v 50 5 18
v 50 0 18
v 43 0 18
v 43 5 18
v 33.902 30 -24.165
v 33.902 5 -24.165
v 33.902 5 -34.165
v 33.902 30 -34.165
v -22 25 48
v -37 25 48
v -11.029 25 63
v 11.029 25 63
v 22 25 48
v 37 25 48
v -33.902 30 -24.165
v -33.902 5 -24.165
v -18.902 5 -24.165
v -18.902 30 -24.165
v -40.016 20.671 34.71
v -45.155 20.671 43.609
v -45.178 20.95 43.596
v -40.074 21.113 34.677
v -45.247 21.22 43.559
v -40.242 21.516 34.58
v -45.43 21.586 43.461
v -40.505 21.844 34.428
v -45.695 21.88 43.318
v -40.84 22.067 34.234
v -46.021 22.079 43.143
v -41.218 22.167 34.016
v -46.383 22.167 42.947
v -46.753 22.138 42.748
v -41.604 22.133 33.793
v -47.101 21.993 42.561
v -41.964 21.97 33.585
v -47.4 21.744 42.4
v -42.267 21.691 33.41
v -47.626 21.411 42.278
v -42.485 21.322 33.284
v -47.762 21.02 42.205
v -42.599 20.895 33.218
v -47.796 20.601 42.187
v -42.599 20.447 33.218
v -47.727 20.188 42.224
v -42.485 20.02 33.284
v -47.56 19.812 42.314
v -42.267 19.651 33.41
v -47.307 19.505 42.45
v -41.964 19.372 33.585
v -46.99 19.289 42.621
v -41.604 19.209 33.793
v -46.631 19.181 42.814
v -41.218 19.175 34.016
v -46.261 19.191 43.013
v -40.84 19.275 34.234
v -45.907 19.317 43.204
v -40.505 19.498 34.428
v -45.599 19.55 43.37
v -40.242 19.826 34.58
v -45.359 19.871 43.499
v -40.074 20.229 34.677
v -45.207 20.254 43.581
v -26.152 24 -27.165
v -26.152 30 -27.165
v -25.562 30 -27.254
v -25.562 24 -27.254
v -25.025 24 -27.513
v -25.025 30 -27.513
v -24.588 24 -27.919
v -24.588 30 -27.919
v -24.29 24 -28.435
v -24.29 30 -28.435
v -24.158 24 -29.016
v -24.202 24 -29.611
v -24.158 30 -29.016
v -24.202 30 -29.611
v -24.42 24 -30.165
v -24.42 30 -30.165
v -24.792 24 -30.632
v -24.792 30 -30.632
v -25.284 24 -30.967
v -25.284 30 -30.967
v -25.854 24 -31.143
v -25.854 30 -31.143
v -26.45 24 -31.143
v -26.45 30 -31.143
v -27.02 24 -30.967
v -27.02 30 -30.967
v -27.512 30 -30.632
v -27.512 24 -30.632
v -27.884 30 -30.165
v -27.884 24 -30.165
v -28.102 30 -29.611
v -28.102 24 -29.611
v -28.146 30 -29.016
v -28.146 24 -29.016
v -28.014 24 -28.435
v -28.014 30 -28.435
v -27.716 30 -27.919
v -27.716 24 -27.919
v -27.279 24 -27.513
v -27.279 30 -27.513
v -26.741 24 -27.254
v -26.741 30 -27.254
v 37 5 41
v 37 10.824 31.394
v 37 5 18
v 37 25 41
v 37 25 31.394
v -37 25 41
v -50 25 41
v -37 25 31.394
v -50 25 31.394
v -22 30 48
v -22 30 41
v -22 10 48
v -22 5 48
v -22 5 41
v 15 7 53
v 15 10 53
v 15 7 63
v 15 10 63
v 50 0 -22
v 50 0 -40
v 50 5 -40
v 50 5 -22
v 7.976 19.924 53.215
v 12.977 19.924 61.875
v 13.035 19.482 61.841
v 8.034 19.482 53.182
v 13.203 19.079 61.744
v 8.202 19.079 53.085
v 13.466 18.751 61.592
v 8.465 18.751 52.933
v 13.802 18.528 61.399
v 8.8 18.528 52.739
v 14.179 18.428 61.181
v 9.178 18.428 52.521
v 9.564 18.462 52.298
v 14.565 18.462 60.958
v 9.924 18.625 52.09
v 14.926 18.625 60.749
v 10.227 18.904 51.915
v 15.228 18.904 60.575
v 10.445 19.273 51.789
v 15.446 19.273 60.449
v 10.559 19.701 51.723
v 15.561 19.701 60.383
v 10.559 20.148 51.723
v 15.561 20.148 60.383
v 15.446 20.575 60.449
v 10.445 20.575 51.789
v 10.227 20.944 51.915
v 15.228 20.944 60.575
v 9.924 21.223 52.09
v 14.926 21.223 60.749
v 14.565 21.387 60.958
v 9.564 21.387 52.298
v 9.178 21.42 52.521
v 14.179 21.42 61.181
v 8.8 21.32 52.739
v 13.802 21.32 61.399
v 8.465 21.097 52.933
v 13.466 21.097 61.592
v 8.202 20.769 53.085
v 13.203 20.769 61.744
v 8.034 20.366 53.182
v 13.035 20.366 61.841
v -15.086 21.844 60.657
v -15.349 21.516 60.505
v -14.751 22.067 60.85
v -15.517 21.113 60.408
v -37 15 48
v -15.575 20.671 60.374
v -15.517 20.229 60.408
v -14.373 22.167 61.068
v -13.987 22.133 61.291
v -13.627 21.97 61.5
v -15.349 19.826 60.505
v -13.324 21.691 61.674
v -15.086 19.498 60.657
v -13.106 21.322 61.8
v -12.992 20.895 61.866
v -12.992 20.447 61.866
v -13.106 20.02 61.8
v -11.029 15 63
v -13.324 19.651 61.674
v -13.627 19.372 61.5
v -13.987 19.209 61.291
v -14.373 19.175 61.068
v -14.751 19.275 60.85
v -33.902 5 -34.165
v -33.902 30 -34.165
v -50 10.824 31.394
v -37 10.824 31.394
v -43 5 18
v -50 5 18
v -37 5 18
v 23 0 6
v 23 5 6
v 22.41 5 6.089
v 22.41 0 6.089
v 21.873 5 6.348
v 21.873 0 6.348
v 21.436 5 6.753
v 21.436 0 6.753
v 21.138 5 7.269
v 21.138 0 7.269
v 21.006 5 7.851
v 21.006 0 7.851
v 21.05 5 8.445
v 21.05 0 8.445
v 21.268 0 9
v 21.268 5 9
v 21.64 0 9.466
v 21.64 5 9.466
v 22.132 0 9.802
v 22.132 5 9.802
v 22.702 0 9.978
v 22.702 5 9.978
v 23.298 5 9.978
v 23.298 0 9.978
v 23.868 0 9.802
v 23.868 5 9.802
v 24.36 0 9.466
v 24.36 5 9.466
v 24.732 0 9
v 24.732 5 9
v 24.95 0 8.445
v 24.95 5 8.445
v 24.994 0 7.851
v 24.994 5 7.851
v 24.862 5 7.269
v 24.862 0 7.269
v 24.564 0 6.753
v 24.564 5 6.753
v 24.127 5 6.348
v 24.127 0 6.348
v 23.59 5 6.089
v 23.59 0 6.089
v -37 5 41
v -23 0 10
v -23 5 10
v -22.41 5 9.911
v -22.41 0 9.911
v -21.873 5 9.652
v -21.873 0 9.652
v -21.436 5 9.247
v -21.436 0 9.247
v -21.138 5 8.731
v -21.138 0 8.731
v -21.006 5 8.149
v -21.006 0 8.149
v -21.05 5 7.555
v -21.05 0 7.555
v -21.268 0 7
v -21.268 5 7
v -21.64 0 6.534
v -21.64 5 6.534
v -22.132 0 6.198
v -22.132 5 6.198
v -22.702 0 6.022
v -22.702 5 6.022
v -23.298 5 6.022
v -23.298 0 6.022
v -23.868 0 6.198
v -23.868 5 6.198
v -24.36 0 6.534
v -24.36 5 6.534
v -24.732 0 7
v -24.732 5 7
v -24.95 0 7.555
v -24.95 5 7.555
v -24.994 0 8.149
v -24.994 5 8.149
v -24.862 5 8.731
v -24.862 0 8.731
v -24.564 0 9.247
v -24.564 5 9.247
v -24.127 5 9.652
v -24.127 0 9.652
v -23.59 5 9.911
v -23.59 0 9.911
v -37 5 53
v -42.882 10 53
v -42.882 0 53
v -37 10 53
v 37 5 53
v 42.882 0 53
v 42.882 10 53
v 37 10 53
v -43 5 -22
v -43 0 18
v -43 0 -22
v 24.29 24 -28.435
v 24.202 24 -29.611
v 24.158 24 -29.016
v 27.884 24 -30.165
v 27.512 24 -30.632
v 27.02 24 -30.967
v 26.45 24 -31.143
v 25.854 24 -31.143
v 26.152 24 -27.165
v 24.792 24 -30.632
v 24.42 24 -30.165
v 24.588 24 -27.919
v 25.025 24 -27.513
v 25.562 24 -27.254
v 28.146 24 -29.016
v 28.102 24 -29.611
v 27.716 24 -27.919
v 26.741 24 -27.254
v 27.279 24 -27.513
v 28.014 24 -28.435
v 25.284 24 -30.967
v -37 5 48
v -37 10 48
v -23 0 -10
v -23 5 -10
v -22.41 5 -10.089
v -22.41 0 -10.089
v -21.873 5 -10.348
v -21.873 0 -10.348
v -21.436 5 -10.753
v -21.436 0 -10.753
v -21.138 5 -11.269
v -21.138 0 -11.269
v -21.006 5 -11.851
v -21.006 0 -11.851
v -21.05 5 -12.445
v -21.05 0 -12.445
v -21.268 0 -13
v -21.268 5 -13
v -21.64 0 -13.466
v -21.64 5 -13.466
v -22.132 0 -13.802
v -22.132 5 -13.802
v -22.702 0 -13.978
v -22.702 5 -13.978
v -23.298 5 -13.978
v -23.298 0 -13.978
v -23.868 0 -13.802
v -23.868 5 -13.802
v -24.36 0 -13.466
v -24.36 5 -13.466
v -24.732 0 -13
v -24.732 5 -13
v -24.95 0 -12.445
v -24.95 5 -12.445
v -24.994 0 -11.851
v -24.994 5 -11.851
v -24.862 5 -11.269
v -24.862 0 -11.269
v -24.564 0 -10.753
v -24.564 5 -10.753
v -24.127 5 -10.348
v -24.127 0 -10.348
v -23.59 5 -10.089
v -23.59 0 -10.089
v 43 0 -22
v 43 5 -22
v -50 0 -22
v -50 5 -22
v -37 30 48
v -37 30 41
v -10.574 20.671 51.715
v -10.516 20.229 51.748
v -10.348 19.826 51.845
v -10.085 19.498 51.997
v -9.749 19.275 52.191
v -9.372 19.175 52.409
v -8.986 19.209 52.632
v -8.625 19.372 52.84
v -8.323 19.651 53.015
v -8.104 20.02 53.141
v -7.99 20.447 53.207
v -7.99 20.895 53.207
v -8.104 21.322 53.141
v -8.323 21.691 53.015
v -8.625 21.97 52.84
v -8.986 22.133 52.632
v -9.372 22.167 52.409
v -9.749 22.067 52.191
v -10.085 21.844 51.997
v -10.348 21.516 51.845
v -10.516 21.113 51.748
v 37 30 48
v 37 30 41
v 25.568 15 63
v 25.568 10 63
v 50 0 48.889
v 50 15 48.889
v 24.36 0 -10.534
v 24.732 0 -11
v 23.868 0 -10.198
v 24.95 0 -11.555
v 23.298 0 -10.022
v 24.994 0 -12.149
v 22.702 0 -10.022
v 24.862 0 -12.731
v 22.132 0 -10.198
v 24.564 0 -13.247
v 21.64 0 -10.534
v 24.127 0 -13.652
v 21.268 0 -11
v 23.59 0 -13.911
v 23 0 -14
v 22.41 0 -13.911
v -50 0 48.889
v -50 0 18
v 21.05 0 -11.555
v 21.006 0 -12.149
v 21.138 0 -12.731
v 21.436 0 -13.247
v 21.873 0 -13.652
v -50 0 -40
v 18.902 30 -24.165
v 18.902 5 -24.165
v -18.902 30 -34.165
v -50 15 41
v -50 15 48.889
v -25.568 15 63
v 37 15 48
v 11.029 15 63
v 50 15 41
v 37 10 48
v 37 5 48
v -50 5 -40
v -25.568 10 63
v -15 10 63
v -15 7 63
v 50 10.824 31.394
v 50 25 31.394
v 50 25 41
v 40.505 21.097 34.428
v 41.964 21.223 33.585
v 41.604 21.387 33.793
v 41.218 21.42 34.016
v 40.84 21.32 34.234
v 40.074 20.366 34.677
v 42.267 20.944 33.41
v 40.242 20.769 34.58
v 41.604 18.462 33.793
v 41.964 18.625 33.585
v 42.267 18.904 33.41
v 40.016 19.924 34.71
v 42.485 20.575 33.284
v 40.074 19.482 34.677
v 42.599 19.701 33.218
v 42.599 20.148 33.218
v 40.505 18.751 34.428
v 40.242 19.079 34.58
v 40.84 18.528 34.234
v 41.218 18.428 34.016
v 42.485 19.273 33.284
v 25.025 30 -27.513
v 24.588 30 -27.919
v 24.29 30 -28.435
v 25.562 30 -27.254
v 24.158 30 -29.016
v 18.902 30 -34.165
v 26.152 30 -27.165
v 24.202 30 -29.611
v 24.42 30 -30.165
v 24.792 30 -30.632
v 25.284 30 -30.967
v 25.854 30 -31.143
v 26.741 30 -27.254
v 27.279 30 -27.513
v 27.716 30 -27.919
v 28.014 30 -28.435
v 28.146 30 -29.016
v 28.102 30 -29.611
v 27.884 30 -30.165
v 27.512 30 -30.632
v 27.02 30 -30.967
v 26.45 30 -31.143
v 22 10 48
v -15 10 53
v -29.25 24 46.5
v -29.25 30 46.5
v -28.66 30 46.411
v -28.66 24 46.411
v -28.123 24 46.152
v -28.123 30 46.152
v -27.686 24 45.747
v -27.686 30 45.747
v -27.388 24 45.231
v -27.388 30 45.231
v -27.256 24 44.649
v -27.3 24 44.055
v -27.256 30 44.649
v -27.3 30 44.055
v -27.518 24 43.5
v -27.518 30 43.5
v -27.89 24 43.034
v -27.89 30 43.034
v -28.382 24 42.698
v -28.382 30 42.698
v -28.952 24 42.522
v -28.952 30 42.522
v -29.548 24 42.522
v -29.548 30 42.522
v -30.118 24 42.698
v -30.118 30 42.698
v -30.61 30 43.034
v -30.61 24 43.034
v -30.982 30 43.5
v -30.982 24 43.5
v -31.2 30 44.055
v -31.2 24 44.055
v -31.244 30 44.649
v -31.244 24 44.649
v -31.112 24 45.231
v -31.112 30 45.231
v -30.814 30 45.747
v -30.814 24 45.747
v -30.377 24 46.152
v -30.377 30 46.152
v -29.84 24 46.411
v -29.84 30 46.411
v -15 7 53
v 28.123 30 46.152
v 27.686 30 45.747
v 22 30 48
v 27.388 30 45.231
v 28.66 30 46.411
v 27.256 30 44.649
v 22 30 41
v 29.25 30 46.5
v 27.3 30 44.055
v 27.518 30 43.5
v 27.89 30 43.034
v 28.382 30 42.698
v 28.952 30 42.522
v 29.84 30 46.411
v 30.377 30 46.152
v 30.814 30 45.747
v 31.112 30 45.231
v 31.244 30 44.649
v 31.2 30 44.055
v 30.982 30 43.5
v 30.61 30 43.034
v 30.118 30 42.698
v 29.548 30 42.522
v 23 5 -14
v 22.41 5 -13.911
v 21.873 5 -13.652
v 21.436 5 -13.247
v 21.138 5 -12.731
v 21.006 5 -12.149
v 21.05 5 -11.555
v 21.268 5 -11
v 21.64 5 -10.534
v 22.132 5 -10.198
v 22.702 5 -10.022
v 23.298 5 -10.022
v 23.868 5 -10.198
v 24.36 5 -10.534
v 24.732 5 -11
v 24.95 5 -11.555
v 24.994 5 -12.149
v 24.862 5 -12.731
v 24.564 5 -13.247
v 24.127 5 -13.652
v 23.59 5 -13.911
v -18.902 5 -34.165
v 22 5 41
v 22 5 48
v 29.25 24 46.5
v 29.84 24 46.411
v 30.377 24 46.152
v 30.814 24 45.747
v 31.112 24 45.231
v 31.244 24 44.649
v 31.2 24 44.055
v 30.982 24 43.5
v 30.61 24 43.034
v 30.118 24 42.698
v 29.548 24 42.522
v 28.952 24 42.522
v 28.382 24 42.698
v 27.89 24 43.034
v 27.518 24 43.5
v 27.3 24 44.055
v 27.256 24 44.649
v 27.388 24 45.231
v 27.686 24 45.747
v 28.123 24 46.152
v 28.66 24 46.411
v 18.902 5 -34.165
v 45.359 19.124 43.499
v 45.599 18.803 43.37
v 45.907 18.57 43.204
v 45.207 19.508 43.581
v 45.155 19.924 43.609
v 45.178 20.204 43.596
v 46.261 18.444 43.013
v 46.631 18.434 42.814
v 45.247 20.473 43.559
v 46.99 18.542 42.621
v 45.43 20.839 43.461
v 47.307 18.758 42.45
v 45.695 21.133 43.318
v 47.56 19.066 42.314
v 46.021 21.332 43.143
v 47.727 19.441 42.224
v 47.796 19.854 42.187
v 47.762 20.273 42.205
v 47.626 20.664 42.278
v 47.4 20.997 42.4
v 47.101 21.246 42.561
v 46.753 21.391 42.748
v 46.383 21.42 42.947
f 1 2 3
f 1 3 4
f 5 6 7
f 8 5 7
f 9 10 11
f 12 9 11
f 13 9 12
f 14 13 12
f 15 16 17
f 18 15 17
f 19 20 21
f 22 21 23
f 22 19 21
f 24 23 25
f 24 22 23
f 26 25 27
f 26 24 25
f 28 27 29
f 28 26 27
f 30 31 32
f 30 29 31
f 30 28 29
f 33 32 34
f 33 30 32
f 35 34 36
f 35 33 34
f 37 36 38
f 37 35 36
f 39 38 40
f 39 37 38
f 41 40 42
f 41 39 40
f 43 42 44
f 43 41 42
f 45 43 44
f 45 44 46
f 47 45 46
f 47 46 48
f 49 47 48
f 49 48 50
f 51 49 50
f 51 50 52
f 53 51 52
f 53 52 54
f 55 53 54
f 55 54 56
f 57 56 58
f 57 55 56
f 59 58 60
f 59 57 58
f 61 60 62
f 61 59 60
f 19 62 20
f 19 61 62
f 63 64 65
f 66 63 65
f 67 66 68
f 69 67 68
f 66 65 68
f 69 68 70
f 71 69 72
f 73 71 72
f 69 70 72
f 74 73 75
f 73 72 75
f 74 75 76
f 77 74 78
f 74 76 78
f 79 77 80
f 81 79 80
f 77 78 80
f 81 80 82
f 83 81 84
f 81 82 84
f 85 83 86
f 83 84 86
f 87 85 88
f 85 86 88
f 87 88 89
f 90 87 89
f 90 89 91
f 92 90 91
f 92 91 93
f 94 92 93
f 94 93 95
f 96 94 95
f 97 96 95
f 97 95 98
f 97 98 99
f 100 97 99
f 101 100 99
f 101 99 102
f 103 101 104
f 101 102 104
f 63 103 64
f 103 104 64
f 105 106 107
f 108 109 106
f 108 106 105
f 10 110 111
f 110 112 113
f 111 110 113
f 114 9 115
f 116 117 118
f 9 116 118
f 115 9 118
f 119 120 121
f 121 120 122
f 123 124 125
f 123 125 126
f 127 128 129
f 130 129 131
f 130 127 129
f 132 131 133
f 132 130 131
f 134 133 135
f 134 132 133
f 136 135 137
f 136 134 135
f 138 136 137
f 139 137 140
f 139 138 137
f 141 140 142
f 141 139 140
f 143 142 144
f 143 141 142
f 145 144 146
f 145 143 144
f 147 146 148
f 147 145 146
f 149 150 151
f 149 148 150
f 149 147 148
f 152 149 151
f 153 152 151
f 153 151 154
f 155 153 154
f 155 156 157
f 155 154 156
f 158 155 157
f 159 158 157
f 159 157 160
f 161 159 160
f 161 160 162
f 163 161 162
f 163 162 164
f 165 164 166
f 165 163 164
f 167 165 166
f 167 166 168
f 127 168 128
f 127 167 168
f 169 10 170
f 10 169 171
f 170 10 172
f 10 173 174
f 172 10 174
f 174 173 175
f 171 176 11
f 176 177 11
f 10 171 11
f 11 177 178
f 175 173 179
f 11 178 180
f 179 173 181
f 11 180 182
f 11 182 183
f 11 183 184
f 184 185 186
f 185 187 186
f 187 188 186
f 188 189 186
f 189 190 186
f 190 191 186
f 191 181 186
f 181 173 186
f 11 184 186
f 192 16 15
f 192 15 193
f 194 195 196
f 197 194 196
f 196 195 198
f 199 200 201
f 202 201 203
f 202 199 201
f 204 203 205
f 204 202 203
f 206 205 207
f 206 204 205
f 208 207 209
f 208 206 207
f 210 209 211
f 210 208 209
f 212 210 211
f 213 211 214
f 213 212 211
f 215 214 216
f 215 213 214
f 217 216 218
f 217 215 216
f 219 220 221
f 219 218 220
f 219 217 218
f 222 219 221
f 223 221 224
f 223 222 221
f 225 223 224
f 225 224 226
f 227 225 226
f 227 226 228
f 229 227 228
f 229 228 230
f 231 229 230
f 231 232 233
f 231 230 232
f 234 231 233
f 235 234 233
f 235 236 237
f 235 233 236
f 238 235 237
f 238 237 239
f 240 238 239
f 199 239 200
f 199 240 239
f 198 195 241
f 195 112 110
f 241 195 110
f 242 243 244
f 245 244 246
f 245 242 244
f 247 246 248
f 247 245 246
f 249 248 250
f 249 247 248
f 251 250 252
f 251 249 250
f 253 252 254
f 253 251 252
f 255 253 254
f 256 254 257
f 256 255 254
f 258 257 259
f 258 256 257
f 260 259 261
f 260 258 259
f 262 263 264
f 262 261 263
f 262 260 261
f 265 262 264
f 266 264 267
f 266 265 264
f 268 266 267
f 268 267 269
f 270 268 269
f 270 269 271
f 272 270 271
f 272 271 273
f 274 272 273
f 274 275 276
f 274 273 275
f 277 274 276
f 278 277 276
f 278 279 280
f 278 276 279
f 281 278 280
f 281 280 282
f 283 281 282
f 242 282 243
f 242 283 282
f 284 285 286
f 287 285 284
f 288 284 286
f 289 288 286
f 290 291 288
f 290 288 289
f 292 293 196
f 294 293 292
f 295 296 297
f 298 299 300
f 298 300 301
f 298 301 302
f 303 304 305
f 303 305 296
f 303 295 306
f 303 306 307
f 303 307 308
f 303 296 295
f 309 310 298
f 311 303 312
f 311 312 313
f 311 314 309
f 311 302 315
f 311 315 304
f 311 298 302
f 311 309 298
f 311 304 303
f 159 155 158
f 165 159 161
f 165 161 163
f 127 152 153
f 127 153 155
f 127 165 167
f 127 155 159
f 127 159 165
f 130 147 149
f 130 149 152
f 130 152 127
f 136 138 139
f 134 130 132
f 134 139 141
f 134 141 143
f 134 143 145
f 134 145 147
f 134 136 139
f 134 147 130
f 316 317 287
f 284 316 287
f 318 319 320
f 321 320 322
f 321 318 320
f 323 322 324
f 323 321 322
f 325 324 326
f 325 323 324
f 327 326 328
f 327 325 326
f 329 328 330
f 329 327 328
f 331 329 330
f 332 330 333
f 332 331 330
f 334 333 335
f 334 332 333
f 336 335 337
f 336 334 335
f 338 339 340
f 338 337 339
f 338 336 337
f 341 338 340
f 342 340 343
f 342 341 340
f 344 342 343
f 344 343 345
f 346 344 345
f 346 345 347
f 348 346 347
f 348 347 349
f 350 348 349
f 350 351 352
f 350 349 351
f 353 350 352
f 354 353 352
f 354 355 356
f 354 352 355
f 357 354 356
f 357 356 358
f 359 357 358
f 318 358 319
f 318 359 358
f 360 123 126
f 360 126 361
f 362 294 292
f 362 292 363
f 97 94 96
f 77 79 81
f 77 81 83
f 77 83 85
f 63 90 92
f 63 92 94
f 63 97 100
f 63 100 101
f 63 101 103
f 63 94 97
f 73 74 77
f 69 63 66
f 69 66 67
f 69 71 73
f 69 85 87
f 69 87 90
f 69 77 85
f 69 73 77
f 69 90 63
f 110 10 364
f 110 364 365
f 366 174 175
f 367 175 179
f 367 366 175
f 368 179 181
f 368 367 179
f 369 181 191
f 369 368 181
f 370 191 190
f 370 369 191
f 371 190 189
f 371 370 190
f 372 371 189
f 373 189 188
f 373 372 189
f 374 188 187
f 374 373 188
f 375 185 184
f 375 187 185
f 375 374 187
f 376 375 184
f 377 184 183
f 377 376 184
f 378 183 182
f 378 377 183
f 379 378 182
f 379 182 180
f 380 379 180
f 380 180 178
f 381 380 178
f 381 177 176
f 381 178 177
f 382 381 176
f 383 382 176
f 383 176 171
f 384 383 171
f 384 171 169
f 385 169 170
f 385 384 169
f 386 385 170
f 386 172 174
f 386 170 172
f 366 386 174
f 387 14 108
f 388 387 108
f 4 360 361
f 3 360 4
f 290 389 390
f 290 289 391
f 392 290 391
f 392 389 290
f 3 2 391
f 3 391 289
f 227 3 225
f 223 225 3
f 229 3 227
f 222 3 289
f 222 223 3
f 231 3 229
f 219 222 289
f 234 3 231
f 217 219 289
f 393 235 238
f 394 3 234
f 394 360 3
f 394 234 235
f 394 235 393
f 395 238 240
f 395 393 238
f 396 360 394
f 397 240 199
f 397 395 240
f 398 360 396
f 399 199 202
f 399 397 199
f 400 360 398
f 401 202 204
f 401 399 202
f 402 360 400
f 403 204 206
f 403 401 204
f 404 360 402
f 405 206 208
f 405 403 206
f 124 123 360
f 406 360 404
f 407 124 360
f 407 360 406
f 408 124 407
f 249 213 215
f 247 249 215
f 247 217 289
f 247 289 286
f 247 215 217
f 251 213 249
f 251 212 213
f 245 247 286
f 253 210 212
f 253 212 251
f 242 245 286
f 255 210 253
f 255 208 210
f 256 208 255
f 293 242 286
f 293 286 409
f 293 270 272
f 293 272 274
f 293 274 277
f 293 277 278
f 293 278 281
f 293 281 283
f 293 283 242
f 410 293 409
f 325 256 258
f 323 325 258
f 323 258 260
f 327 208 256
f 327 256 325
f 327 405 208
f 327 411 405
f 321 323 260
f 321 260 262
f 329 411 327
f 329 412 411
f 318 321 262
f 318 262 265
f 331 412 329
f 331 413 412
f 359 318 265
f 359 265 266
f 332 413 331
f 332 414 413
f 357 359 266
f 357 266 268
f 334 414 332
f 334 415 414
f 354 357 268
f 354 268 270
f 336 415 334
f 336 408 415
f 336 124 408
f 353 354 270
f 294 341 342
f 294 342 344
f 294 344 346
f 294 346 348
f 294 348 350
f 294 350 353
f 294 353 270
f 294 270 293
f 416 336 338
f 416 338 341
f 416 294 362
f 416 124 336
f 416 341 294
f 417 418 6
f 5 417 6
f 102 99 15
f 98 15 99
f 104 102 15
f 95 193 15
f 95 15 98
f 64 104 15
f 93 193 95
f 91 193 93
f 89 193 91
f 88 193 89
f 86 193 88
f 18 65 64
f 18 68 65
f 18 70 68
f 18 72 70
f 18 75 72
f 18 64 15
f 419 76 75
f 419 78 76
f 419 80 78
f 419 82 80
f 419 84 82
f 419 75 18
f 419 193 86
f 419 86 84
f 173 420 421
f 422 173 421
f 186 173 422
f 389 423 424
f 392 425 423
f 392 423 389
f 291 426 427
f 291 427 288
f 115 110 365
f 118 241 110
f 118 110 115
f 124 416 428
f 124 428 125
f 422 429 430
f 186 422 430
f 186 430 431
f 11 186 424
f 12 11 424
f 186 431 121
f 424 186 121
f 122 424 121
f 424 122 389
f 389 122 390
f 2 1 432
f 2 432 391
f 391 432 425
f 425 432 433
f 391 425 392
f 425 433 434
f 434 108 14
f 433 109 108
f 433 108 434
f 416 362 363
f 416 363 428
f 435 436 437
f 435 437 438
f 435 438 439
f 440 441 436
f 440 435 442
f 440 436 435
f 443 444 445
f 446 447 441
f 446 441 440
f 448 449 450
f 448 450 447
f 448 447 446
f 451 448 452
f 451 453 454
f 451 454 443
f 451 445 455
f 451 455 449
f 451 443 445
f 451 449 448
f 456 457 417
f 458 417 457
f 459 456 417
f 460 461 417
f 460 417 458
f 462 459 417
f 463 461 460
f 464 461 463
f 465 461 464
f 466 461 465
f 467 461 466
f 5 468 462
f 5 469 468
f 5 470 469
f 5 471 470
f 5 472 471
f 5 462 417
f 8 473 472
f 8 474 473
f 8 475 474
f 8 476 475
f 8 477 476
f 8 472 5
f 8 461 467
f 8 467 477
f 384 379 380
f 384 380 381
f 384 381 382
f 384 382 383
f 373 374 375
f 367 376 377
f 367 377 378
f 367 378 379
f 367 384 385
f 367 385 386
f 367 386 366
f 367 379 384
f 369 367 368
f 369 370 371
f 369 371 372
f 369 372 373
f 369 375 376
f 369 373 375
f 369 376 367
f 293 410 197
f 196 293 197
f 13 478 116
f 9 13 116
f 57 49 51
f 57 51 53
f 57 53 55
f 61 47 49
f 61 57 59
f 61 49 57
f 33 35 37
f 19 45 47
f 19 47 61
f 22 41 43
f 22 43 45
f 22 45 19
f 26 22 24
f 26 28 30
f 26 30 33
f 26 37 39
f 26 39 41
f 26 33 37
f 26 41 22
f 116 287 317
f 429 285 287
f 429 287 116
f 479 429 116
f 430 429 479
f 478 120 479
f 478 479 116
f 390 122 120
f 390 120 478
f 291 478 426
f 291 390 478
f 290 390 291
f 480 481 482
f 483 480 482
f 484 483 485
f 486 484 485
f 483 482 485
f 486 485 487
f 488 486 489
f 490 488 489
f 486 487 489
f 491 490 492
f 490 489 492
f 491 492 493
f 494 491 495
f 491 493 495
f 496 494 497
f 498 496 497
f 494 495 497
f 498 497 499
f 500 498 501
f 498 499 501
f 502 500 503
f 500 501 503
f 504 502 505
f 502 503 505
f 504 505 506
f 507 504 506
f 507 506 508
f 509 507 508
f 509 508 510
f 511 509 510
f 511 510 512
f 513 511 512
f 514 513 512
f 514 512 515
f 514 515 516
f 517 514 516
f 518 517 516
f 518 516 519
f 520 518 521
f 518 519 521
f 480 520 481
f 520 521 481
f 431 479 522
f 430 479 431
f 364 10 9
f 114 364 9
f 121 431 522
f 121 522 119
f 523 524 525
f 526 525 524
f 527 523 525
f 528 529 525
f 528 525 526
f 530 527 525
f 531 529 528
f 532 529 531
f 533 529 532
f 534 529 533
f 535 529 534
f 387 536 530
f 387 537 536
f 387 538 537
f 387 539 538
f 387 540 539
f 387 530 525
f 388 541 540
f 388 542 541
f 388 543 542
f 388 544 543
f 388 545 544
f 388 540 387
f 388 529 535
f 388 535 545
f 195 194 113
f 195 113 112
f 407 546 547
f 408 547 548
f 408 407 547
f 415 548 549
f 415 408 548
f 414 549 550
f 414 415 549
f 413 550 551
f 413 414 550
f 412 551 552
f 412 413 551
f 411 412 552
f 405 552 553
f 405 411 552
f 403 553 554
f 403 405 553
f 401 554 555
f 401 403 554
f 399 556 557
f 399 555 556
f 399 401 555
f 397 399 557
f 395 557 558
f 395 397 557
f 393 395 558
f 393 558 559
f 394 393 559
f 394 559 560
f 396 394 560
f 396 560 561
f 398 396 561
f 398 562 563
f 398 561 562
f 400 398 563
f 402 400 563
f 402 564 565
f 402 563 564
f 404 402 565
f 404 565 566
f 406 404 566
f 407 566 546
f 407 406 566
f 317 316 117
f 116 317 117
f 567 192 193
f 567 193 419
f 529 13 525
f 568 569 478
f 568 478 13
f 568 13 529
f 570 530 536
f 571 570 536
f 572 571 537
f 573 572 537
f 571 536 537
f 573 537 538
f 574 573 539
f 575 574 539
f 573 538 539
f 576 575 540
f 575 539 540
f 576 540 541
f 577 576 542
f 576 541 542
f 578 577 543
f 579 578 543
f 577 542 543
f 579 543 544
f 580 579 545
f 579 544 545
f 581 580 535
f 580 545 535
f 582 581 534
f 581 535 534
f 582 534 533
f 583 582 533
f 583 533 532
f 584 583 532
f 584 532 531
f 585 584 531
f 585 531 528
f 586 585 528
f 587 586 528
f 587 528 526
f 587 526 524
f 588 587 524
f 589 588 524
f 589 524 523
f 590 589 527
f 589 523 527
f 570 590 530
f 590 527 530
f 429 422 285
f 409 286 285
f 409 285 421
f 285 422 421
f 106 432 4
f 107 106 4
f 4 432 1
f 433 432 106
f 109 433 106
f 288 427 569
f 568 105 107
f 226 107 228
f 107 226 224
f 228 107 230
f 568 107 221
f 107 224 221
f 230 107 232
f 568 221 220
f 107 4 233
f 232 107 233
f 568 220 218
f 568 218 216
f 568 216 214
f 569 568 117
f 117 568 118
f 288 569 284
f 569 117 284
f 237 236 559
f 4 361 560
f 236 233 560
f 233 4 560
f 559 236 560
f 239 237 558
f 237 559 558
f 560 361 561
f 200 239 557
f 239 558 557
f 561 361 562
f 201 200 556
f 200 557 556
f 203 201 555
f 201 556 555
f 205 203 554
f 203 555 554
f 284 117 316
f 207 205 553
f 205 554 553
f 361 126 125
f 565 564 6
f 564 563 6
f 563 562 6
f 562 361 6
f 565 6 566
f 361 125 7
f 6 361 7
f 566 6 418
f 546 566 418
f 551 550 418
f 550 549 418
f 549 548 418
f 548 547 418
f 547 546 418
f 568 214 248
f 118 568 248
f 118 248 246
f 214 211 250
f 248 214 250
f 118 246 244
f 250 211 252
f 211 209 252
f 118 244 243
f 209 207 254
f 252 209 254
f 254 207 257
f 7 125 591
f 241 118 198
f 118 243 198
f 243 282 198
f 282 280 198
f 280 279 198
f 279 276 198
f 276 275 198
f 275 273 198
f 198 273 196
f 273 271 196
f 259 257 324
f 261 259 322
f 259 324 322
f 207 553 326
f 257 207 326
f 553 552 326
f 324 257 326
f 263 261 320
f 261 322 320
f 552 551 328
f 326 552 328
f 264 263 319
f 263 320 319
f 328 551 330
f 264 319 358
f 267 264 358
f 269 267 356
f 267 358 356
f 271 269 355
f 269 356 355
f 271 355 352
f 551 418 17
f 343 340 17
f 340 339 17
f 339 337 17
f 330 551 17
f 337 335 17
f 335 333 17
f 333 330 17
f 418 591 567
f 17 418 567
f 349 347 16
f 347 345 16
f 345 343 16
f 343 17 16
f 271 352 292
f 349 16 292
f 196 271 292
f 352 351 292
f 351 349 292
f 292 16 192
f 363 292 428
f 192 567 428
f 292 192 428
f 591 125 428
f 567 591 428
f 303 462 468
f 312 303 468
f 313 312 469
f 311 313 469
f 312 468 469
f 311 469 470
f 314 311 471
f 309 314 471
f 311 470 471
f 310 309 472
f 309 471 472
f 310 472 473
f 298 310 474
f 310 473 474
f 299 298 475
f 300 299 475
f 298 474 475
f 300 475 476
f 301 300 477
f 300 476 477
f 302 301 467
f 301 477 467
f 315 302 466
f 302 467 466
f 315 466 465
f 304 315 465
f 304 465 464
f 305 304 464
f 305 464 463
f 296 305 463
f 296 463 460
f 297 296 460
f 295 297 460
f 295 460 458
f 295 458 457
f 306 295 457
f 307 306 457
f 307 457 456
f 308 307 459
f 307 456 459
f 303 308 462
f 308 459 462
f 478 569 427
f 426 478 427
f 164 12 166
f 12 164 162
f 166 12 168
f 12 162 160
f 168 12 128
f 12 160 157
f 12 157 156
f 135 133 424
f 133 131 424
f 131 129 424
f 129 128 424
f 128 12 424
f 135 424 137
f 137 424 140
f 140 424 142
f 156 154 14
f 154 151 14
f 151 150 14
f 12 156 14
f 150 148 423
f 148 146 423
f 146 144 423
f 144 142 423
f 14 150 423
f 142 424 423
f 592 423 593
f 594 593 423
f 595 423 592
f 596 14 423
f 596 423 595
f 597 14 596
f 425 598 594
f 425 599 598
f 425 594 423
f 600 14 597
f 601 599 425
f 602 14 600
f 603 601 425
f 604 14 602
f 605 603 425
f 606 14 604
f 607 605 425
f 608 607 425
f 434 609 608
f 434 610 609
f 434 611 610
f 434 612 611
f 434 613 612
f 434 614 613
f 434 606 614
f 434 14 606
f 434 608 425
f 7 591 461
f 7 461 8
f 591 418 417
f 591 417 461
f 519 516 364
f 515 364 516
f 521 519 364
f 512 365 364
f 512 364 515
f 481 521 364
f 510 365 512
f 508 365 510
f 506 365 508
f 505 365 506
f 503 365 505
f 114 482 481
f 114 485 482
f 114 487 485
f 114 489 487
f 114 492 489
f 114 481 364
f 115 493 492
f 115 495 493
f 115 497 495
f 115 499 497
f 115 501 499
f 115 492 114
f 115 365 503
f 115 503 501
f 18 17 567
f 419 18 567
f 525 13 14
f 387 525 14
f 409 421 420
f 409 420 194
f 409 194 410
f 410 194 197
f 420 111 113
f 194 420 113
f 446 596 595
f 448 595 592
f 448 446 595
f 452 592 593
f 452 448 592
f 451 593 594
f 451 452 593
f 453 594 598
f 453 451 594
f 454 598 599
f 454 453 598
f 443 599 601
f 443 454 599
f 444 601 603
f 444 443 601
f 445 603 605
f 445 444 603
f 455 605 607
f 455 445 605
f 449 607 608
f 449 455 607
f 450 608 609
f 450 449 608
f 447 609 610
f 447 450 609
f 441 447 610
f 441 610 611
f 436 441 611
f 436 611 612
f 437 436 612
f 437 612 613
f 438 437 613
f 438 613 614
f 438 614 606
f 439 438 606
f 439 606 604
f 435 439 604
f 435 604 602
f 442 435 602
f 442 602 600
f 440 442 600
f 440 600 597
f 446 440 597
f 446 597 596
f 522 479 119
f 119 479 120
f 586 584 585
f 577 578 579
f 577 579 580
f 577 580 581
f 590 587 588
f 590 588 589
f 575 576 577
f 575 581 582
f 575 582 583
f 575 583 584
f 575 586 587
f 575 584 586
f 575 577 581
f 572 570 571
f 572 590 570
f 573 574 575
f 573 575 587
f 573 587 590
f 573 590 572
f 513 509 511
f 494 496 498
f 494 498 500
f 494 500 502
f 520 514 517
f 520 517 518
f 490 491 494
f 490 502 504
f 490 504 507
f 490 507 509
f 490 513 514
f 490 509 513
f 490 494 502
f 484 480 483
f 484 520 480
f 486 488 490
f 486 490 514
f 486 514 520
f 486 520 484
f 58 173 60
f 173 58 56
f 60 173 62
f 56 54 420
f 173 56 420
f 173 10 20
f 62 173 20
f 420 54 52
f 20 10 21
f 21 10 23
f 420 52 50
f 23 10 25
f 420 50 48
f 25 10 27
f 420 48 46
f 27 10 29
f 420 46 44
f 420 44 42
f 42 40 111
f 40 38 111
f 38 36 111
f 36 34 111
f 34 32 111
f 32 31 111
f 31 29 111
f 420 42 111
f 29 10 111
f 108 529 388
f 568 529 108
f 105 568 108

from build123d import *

# Parameters (mm, degrees)
SKETCH1_R                = 2
BOSS_EXTRUDE1_DEPTH      = 5
SKETCH3_W                = 15
SKETCH3_H                = 7
SKETCH3_H_2              = 10
BOSS_EXTRUDE3_DEPTH      = 25
SKETCH4_R                = 2
CUT_EXTRUDE1_DEPTH       = 6
SKETCH8_W                = 45
SKETCH8_H                = 10
BOSS_EXTRUDE7_DEPTH      = 13
SKETCH17_W               = 100
SKETCH17_H               = 15
BOSS_EXTRUDE11_DEPTH     = 5
BOSS_EXTRUDE12_DEPTH     = 10
SKETCH19_W               = 13
SKETCH19_H               = 5
CUT_EXTRUDE7_DEPTH       = 10
CUT_EXTRUDE8_DEPTH       = 20
CUT_EXTRUDE9_DEPTH       = 120
BOSS_EXTRUDE13_DEPTH     = 20
CUT_EXTRUDE10_DEPTH      = 10
CUT_EXTRUDE10_DEPTH_BACK = 10
SKETCH22_R               = 1.5
CUT_EXTRUDE11_DEPTH      = 10
CUT_EXTRUDE11_DEPTH_BACK = 10
SKETCH24_R               = 1.5
SKETCH25_W               = 30
SKETCH25_H               = 10
BOSS_EXTRUDE14_DEPTH     = 3


with BuildPart() as part:
    # Sketch1 → Boss-Extrude1 (new body)
    with BuildSketch(Plane(origin=(0, 0, 0), x_dir=(1, 0, 0), z_dir=(0, 1, 0))):
        Polygon((-50, 40), (50, 40), (50, 22), (43, 22), (43, -18), (50, -18), (50, -53), (35, -53), (-35, -53), (-50, -53), (-50, -18), (-43, -18), (-43, 22), (-50, 22), align=None)
        with Locations((-23, 12)):
            Circle(SKETCH1_R, mode=Mode.SUBTRACT)
        with Locations((-23, -8)):
            Circle(SKETCH1_R, mode=Mode.SUBTRACT)
        with Locations((23, -8)):
            Circle(SKETCH1_R, mode=Mode.SUBTRACT)
        with Locations((23, 12)):
            Circle(SKETCH1_R, mode=Mode.SUBTRACT)
    extrude(amount=BOSS_EXTRUDE1_DEPTH)

    # Sketch3 → Boss-Extrude3 (add)
    with BuildSketch(Plane(origin=(0, 5, 0), x_dir=(1, 0, 0), z_dir=(0, 1, 0))):
        with Locations((-29.5, -44.5)):
            Rectangle(SKETCH3_W, SKETCH3_H)
        with Locations((-26.401946621, 29.165492724)):
            Rectangle(SKETCH3_W, SKETCH3_H_2)
        with Locations((29.5, -44.5)):
            Rectangle(SKETCH3_W, SKETCH3_H)
        with Locations((26.401946621, 29.165492724)):
            Rectangle(SKETCH3_W, SKETCH3_H_2)
    extrude(amount=BOSS_EXTRUDE3_DEPTH)

    # Sketch4 → Cut-Extrude1 (cut)
    with BuildSketch(Plane(origin=(0, 30, 0), x_dir=(1, 0, 0), z_dir=(0, 1, 0))):
        with Locations((-29.25, -44.5)):
            Circle(SKETCH4_R)
        with Locations((29.25, -44.5)):
            Circle(SKETCH4_R)
        with Locations((-26.151946621, 29.165492724)):
            Circle(SKETCH4_R)
        with Locations((26.151946621, 29.165492724)):
            Circle(SKETCH4_R)
    extrude(amount=-CUT_EXTRUDE1_DEPTH, mode=Mode.SUBTRACT)

    # Sketch8 → Boss-Extrude7 (add)
    with BuildSketch(Plane.ZY.offset(37)):
        with Locations((40.5, 10)):
            Rectangle(SKETCH8_W, SKETCH8_H)
    extrude(amount=BOSS_EXTRUDE7_DEPTH)

    # Mirror2: part across plane


with BuildPart() as part_1:
    add(part.part)
    add(part.part.mirror(Plane(origin=(0, 0, 0), x_dir=(0, 0, 1), z_dir=(1, 0, 0))))

    # Sketch17 → Boss-Extrude11 (add)
    with BuildSketch(Plane(origin=(0, 15, 0), x_dir=(1, 0, 0), z_dir=(0, 1, 0))):
        with Locations((0, -55.5)):
            Rectangle(SKETCH17_W, SKETCH17_H)
    extrude(amount=-BOSS_EXTRUDE11_DEPTH)

    # Sketch18 → Boss-Extrude12 (add)
    with BuildSketch(Plane(origin=(0, 15, 0), x_dir=(1, 0, 0), z_dir=(0, 1, 0))):
        Polygon((-37, -48), (-11.02885683, -63), (11.02885683, -63), (37, -48), align=None)
    extrude(amount=BOSS_EXTRUDE12_DEPTH)

    # Sketch19 → Cut-Extrude7 (cut)
    with BuildSketch(Plane.XY.offset(63)):
        with Locations((-43.5, 7.5)):
            Rectangle(SKETCH19_W, SKETCH19_H)
        with Locations((43.5, 7.5)):
            Rectangle(SKETCH19_W, SKETCH19_H)
    extrude(amount=-CUT_EXTRUDE7_DEPTH, mode=Mode.SUBTRACT)

    # Sketch20 → Cut-Extrude8 (cut)
    with BuildSketch(Plane(origin=(0, 15, 0), x_dir=(1, 0, 0), z_dir=(0, 1, 0))):
        Polygon((-25.568008611, -63), (-50, -48.888958818), (-50, -63), align=None)
        Polygon((50, -48.888958818), (50, -63), (25.568008611, -63), align=None)
    extrude(amount=-CUT_EXTRUDE8_DEPTH, mode=Mode.SUBTRACT)

    # Sketch21 → Cut-Extrude9 (cut)
    with BuildSketch(Plane(origin=(50, 0, 0), x_dir=(0, 0, -1), z_dir=(1, 0, 0))):
        Polygon((-41, 15), (-18, 5), (-18, 15), align=None)
    extrude(amount=-CUT_EXTRUDE9_DEPTH, mode=Mode.SUBTRACT)

    # Sketch23 → Boss-Extrude13 (add)
    with BuildSketch(Plane(origin=(0, 25, 0), x_dir=(1, 0, 0), z_dir=(0, 1, 0))):
        Polygon((-37, -48), (-50, -41), (-50, -31.394208948), (-37, -31.394208948), align=None)
        Polygon((50, -31.394208948), (37, -31.394208948), (37, -48), (50, -41), align=None)
    extrude(amount=-BOSS_EXTRUDE13_DEPTH)

    # Sketch22 → Cut-Extrude10 (cut, two sides: drawn at the far end of the back side and taken through both)
    with BuildSketch(Plane(origin=(-30.043596157, 0, 52.017769143), x_dir=(0.8659452125260777, 0, 0.5001388696183953), z_dir=(-0.5001388696183953, 0, 0.8659452125260777)).offset(-CUT_EXTRUDE10_DEPTH_BACK)):
        with Locations((-18.791636985, 20.670945853)):
            Circle(SKETCH22_R)
        with Locations((18.208363015, 20.670945853)):
            Circle(SKETCH22_R)
    extrude(amount=CUT_EXTRUDE10_DEPTH + CUT_EXTRUDE10_DEPTH_BACK, mode=Mode.SUBTRACT)

    # Sketch24 → Cut-Extrude11 (cut, two sides: drawn at the far end of the back side and taken through both)
    with BuildSketch(Plane(origin=(30.043596157, 0, 52.017769143), x_dir=(0.8659452125260774, 0, -0.5001388696183958), z_dir=(0.5001388696183958, 0, 0.8659452125260774)).offset(-CUT_EXTRUDE11_DEPTH_BACK)):
        with Locations((-18.208363015, 19.924140623)):
            Circle(SKETCH24_R)
        with Locations((18.791636985, 19.924140623)):
            Circle(SKETCH24_R)
    extrude(amount=CUT_EXTRUDE11_DEPTH + CUT_EXTRUDE11_DEPTH_BACK, mode=Mode.SUBTRACT)

    # Sketch25 → Boss-Extrude14 (add)
    with BuildSketch(Plane.XZ.offset(-10)):
        with Locations((0, 58)):
            Rectangle(SKETCH25_W, SKETCH25_H)
    extrude(amount=BOSS_EXTRUDE14_DEPTH)


solid = part_1.part
